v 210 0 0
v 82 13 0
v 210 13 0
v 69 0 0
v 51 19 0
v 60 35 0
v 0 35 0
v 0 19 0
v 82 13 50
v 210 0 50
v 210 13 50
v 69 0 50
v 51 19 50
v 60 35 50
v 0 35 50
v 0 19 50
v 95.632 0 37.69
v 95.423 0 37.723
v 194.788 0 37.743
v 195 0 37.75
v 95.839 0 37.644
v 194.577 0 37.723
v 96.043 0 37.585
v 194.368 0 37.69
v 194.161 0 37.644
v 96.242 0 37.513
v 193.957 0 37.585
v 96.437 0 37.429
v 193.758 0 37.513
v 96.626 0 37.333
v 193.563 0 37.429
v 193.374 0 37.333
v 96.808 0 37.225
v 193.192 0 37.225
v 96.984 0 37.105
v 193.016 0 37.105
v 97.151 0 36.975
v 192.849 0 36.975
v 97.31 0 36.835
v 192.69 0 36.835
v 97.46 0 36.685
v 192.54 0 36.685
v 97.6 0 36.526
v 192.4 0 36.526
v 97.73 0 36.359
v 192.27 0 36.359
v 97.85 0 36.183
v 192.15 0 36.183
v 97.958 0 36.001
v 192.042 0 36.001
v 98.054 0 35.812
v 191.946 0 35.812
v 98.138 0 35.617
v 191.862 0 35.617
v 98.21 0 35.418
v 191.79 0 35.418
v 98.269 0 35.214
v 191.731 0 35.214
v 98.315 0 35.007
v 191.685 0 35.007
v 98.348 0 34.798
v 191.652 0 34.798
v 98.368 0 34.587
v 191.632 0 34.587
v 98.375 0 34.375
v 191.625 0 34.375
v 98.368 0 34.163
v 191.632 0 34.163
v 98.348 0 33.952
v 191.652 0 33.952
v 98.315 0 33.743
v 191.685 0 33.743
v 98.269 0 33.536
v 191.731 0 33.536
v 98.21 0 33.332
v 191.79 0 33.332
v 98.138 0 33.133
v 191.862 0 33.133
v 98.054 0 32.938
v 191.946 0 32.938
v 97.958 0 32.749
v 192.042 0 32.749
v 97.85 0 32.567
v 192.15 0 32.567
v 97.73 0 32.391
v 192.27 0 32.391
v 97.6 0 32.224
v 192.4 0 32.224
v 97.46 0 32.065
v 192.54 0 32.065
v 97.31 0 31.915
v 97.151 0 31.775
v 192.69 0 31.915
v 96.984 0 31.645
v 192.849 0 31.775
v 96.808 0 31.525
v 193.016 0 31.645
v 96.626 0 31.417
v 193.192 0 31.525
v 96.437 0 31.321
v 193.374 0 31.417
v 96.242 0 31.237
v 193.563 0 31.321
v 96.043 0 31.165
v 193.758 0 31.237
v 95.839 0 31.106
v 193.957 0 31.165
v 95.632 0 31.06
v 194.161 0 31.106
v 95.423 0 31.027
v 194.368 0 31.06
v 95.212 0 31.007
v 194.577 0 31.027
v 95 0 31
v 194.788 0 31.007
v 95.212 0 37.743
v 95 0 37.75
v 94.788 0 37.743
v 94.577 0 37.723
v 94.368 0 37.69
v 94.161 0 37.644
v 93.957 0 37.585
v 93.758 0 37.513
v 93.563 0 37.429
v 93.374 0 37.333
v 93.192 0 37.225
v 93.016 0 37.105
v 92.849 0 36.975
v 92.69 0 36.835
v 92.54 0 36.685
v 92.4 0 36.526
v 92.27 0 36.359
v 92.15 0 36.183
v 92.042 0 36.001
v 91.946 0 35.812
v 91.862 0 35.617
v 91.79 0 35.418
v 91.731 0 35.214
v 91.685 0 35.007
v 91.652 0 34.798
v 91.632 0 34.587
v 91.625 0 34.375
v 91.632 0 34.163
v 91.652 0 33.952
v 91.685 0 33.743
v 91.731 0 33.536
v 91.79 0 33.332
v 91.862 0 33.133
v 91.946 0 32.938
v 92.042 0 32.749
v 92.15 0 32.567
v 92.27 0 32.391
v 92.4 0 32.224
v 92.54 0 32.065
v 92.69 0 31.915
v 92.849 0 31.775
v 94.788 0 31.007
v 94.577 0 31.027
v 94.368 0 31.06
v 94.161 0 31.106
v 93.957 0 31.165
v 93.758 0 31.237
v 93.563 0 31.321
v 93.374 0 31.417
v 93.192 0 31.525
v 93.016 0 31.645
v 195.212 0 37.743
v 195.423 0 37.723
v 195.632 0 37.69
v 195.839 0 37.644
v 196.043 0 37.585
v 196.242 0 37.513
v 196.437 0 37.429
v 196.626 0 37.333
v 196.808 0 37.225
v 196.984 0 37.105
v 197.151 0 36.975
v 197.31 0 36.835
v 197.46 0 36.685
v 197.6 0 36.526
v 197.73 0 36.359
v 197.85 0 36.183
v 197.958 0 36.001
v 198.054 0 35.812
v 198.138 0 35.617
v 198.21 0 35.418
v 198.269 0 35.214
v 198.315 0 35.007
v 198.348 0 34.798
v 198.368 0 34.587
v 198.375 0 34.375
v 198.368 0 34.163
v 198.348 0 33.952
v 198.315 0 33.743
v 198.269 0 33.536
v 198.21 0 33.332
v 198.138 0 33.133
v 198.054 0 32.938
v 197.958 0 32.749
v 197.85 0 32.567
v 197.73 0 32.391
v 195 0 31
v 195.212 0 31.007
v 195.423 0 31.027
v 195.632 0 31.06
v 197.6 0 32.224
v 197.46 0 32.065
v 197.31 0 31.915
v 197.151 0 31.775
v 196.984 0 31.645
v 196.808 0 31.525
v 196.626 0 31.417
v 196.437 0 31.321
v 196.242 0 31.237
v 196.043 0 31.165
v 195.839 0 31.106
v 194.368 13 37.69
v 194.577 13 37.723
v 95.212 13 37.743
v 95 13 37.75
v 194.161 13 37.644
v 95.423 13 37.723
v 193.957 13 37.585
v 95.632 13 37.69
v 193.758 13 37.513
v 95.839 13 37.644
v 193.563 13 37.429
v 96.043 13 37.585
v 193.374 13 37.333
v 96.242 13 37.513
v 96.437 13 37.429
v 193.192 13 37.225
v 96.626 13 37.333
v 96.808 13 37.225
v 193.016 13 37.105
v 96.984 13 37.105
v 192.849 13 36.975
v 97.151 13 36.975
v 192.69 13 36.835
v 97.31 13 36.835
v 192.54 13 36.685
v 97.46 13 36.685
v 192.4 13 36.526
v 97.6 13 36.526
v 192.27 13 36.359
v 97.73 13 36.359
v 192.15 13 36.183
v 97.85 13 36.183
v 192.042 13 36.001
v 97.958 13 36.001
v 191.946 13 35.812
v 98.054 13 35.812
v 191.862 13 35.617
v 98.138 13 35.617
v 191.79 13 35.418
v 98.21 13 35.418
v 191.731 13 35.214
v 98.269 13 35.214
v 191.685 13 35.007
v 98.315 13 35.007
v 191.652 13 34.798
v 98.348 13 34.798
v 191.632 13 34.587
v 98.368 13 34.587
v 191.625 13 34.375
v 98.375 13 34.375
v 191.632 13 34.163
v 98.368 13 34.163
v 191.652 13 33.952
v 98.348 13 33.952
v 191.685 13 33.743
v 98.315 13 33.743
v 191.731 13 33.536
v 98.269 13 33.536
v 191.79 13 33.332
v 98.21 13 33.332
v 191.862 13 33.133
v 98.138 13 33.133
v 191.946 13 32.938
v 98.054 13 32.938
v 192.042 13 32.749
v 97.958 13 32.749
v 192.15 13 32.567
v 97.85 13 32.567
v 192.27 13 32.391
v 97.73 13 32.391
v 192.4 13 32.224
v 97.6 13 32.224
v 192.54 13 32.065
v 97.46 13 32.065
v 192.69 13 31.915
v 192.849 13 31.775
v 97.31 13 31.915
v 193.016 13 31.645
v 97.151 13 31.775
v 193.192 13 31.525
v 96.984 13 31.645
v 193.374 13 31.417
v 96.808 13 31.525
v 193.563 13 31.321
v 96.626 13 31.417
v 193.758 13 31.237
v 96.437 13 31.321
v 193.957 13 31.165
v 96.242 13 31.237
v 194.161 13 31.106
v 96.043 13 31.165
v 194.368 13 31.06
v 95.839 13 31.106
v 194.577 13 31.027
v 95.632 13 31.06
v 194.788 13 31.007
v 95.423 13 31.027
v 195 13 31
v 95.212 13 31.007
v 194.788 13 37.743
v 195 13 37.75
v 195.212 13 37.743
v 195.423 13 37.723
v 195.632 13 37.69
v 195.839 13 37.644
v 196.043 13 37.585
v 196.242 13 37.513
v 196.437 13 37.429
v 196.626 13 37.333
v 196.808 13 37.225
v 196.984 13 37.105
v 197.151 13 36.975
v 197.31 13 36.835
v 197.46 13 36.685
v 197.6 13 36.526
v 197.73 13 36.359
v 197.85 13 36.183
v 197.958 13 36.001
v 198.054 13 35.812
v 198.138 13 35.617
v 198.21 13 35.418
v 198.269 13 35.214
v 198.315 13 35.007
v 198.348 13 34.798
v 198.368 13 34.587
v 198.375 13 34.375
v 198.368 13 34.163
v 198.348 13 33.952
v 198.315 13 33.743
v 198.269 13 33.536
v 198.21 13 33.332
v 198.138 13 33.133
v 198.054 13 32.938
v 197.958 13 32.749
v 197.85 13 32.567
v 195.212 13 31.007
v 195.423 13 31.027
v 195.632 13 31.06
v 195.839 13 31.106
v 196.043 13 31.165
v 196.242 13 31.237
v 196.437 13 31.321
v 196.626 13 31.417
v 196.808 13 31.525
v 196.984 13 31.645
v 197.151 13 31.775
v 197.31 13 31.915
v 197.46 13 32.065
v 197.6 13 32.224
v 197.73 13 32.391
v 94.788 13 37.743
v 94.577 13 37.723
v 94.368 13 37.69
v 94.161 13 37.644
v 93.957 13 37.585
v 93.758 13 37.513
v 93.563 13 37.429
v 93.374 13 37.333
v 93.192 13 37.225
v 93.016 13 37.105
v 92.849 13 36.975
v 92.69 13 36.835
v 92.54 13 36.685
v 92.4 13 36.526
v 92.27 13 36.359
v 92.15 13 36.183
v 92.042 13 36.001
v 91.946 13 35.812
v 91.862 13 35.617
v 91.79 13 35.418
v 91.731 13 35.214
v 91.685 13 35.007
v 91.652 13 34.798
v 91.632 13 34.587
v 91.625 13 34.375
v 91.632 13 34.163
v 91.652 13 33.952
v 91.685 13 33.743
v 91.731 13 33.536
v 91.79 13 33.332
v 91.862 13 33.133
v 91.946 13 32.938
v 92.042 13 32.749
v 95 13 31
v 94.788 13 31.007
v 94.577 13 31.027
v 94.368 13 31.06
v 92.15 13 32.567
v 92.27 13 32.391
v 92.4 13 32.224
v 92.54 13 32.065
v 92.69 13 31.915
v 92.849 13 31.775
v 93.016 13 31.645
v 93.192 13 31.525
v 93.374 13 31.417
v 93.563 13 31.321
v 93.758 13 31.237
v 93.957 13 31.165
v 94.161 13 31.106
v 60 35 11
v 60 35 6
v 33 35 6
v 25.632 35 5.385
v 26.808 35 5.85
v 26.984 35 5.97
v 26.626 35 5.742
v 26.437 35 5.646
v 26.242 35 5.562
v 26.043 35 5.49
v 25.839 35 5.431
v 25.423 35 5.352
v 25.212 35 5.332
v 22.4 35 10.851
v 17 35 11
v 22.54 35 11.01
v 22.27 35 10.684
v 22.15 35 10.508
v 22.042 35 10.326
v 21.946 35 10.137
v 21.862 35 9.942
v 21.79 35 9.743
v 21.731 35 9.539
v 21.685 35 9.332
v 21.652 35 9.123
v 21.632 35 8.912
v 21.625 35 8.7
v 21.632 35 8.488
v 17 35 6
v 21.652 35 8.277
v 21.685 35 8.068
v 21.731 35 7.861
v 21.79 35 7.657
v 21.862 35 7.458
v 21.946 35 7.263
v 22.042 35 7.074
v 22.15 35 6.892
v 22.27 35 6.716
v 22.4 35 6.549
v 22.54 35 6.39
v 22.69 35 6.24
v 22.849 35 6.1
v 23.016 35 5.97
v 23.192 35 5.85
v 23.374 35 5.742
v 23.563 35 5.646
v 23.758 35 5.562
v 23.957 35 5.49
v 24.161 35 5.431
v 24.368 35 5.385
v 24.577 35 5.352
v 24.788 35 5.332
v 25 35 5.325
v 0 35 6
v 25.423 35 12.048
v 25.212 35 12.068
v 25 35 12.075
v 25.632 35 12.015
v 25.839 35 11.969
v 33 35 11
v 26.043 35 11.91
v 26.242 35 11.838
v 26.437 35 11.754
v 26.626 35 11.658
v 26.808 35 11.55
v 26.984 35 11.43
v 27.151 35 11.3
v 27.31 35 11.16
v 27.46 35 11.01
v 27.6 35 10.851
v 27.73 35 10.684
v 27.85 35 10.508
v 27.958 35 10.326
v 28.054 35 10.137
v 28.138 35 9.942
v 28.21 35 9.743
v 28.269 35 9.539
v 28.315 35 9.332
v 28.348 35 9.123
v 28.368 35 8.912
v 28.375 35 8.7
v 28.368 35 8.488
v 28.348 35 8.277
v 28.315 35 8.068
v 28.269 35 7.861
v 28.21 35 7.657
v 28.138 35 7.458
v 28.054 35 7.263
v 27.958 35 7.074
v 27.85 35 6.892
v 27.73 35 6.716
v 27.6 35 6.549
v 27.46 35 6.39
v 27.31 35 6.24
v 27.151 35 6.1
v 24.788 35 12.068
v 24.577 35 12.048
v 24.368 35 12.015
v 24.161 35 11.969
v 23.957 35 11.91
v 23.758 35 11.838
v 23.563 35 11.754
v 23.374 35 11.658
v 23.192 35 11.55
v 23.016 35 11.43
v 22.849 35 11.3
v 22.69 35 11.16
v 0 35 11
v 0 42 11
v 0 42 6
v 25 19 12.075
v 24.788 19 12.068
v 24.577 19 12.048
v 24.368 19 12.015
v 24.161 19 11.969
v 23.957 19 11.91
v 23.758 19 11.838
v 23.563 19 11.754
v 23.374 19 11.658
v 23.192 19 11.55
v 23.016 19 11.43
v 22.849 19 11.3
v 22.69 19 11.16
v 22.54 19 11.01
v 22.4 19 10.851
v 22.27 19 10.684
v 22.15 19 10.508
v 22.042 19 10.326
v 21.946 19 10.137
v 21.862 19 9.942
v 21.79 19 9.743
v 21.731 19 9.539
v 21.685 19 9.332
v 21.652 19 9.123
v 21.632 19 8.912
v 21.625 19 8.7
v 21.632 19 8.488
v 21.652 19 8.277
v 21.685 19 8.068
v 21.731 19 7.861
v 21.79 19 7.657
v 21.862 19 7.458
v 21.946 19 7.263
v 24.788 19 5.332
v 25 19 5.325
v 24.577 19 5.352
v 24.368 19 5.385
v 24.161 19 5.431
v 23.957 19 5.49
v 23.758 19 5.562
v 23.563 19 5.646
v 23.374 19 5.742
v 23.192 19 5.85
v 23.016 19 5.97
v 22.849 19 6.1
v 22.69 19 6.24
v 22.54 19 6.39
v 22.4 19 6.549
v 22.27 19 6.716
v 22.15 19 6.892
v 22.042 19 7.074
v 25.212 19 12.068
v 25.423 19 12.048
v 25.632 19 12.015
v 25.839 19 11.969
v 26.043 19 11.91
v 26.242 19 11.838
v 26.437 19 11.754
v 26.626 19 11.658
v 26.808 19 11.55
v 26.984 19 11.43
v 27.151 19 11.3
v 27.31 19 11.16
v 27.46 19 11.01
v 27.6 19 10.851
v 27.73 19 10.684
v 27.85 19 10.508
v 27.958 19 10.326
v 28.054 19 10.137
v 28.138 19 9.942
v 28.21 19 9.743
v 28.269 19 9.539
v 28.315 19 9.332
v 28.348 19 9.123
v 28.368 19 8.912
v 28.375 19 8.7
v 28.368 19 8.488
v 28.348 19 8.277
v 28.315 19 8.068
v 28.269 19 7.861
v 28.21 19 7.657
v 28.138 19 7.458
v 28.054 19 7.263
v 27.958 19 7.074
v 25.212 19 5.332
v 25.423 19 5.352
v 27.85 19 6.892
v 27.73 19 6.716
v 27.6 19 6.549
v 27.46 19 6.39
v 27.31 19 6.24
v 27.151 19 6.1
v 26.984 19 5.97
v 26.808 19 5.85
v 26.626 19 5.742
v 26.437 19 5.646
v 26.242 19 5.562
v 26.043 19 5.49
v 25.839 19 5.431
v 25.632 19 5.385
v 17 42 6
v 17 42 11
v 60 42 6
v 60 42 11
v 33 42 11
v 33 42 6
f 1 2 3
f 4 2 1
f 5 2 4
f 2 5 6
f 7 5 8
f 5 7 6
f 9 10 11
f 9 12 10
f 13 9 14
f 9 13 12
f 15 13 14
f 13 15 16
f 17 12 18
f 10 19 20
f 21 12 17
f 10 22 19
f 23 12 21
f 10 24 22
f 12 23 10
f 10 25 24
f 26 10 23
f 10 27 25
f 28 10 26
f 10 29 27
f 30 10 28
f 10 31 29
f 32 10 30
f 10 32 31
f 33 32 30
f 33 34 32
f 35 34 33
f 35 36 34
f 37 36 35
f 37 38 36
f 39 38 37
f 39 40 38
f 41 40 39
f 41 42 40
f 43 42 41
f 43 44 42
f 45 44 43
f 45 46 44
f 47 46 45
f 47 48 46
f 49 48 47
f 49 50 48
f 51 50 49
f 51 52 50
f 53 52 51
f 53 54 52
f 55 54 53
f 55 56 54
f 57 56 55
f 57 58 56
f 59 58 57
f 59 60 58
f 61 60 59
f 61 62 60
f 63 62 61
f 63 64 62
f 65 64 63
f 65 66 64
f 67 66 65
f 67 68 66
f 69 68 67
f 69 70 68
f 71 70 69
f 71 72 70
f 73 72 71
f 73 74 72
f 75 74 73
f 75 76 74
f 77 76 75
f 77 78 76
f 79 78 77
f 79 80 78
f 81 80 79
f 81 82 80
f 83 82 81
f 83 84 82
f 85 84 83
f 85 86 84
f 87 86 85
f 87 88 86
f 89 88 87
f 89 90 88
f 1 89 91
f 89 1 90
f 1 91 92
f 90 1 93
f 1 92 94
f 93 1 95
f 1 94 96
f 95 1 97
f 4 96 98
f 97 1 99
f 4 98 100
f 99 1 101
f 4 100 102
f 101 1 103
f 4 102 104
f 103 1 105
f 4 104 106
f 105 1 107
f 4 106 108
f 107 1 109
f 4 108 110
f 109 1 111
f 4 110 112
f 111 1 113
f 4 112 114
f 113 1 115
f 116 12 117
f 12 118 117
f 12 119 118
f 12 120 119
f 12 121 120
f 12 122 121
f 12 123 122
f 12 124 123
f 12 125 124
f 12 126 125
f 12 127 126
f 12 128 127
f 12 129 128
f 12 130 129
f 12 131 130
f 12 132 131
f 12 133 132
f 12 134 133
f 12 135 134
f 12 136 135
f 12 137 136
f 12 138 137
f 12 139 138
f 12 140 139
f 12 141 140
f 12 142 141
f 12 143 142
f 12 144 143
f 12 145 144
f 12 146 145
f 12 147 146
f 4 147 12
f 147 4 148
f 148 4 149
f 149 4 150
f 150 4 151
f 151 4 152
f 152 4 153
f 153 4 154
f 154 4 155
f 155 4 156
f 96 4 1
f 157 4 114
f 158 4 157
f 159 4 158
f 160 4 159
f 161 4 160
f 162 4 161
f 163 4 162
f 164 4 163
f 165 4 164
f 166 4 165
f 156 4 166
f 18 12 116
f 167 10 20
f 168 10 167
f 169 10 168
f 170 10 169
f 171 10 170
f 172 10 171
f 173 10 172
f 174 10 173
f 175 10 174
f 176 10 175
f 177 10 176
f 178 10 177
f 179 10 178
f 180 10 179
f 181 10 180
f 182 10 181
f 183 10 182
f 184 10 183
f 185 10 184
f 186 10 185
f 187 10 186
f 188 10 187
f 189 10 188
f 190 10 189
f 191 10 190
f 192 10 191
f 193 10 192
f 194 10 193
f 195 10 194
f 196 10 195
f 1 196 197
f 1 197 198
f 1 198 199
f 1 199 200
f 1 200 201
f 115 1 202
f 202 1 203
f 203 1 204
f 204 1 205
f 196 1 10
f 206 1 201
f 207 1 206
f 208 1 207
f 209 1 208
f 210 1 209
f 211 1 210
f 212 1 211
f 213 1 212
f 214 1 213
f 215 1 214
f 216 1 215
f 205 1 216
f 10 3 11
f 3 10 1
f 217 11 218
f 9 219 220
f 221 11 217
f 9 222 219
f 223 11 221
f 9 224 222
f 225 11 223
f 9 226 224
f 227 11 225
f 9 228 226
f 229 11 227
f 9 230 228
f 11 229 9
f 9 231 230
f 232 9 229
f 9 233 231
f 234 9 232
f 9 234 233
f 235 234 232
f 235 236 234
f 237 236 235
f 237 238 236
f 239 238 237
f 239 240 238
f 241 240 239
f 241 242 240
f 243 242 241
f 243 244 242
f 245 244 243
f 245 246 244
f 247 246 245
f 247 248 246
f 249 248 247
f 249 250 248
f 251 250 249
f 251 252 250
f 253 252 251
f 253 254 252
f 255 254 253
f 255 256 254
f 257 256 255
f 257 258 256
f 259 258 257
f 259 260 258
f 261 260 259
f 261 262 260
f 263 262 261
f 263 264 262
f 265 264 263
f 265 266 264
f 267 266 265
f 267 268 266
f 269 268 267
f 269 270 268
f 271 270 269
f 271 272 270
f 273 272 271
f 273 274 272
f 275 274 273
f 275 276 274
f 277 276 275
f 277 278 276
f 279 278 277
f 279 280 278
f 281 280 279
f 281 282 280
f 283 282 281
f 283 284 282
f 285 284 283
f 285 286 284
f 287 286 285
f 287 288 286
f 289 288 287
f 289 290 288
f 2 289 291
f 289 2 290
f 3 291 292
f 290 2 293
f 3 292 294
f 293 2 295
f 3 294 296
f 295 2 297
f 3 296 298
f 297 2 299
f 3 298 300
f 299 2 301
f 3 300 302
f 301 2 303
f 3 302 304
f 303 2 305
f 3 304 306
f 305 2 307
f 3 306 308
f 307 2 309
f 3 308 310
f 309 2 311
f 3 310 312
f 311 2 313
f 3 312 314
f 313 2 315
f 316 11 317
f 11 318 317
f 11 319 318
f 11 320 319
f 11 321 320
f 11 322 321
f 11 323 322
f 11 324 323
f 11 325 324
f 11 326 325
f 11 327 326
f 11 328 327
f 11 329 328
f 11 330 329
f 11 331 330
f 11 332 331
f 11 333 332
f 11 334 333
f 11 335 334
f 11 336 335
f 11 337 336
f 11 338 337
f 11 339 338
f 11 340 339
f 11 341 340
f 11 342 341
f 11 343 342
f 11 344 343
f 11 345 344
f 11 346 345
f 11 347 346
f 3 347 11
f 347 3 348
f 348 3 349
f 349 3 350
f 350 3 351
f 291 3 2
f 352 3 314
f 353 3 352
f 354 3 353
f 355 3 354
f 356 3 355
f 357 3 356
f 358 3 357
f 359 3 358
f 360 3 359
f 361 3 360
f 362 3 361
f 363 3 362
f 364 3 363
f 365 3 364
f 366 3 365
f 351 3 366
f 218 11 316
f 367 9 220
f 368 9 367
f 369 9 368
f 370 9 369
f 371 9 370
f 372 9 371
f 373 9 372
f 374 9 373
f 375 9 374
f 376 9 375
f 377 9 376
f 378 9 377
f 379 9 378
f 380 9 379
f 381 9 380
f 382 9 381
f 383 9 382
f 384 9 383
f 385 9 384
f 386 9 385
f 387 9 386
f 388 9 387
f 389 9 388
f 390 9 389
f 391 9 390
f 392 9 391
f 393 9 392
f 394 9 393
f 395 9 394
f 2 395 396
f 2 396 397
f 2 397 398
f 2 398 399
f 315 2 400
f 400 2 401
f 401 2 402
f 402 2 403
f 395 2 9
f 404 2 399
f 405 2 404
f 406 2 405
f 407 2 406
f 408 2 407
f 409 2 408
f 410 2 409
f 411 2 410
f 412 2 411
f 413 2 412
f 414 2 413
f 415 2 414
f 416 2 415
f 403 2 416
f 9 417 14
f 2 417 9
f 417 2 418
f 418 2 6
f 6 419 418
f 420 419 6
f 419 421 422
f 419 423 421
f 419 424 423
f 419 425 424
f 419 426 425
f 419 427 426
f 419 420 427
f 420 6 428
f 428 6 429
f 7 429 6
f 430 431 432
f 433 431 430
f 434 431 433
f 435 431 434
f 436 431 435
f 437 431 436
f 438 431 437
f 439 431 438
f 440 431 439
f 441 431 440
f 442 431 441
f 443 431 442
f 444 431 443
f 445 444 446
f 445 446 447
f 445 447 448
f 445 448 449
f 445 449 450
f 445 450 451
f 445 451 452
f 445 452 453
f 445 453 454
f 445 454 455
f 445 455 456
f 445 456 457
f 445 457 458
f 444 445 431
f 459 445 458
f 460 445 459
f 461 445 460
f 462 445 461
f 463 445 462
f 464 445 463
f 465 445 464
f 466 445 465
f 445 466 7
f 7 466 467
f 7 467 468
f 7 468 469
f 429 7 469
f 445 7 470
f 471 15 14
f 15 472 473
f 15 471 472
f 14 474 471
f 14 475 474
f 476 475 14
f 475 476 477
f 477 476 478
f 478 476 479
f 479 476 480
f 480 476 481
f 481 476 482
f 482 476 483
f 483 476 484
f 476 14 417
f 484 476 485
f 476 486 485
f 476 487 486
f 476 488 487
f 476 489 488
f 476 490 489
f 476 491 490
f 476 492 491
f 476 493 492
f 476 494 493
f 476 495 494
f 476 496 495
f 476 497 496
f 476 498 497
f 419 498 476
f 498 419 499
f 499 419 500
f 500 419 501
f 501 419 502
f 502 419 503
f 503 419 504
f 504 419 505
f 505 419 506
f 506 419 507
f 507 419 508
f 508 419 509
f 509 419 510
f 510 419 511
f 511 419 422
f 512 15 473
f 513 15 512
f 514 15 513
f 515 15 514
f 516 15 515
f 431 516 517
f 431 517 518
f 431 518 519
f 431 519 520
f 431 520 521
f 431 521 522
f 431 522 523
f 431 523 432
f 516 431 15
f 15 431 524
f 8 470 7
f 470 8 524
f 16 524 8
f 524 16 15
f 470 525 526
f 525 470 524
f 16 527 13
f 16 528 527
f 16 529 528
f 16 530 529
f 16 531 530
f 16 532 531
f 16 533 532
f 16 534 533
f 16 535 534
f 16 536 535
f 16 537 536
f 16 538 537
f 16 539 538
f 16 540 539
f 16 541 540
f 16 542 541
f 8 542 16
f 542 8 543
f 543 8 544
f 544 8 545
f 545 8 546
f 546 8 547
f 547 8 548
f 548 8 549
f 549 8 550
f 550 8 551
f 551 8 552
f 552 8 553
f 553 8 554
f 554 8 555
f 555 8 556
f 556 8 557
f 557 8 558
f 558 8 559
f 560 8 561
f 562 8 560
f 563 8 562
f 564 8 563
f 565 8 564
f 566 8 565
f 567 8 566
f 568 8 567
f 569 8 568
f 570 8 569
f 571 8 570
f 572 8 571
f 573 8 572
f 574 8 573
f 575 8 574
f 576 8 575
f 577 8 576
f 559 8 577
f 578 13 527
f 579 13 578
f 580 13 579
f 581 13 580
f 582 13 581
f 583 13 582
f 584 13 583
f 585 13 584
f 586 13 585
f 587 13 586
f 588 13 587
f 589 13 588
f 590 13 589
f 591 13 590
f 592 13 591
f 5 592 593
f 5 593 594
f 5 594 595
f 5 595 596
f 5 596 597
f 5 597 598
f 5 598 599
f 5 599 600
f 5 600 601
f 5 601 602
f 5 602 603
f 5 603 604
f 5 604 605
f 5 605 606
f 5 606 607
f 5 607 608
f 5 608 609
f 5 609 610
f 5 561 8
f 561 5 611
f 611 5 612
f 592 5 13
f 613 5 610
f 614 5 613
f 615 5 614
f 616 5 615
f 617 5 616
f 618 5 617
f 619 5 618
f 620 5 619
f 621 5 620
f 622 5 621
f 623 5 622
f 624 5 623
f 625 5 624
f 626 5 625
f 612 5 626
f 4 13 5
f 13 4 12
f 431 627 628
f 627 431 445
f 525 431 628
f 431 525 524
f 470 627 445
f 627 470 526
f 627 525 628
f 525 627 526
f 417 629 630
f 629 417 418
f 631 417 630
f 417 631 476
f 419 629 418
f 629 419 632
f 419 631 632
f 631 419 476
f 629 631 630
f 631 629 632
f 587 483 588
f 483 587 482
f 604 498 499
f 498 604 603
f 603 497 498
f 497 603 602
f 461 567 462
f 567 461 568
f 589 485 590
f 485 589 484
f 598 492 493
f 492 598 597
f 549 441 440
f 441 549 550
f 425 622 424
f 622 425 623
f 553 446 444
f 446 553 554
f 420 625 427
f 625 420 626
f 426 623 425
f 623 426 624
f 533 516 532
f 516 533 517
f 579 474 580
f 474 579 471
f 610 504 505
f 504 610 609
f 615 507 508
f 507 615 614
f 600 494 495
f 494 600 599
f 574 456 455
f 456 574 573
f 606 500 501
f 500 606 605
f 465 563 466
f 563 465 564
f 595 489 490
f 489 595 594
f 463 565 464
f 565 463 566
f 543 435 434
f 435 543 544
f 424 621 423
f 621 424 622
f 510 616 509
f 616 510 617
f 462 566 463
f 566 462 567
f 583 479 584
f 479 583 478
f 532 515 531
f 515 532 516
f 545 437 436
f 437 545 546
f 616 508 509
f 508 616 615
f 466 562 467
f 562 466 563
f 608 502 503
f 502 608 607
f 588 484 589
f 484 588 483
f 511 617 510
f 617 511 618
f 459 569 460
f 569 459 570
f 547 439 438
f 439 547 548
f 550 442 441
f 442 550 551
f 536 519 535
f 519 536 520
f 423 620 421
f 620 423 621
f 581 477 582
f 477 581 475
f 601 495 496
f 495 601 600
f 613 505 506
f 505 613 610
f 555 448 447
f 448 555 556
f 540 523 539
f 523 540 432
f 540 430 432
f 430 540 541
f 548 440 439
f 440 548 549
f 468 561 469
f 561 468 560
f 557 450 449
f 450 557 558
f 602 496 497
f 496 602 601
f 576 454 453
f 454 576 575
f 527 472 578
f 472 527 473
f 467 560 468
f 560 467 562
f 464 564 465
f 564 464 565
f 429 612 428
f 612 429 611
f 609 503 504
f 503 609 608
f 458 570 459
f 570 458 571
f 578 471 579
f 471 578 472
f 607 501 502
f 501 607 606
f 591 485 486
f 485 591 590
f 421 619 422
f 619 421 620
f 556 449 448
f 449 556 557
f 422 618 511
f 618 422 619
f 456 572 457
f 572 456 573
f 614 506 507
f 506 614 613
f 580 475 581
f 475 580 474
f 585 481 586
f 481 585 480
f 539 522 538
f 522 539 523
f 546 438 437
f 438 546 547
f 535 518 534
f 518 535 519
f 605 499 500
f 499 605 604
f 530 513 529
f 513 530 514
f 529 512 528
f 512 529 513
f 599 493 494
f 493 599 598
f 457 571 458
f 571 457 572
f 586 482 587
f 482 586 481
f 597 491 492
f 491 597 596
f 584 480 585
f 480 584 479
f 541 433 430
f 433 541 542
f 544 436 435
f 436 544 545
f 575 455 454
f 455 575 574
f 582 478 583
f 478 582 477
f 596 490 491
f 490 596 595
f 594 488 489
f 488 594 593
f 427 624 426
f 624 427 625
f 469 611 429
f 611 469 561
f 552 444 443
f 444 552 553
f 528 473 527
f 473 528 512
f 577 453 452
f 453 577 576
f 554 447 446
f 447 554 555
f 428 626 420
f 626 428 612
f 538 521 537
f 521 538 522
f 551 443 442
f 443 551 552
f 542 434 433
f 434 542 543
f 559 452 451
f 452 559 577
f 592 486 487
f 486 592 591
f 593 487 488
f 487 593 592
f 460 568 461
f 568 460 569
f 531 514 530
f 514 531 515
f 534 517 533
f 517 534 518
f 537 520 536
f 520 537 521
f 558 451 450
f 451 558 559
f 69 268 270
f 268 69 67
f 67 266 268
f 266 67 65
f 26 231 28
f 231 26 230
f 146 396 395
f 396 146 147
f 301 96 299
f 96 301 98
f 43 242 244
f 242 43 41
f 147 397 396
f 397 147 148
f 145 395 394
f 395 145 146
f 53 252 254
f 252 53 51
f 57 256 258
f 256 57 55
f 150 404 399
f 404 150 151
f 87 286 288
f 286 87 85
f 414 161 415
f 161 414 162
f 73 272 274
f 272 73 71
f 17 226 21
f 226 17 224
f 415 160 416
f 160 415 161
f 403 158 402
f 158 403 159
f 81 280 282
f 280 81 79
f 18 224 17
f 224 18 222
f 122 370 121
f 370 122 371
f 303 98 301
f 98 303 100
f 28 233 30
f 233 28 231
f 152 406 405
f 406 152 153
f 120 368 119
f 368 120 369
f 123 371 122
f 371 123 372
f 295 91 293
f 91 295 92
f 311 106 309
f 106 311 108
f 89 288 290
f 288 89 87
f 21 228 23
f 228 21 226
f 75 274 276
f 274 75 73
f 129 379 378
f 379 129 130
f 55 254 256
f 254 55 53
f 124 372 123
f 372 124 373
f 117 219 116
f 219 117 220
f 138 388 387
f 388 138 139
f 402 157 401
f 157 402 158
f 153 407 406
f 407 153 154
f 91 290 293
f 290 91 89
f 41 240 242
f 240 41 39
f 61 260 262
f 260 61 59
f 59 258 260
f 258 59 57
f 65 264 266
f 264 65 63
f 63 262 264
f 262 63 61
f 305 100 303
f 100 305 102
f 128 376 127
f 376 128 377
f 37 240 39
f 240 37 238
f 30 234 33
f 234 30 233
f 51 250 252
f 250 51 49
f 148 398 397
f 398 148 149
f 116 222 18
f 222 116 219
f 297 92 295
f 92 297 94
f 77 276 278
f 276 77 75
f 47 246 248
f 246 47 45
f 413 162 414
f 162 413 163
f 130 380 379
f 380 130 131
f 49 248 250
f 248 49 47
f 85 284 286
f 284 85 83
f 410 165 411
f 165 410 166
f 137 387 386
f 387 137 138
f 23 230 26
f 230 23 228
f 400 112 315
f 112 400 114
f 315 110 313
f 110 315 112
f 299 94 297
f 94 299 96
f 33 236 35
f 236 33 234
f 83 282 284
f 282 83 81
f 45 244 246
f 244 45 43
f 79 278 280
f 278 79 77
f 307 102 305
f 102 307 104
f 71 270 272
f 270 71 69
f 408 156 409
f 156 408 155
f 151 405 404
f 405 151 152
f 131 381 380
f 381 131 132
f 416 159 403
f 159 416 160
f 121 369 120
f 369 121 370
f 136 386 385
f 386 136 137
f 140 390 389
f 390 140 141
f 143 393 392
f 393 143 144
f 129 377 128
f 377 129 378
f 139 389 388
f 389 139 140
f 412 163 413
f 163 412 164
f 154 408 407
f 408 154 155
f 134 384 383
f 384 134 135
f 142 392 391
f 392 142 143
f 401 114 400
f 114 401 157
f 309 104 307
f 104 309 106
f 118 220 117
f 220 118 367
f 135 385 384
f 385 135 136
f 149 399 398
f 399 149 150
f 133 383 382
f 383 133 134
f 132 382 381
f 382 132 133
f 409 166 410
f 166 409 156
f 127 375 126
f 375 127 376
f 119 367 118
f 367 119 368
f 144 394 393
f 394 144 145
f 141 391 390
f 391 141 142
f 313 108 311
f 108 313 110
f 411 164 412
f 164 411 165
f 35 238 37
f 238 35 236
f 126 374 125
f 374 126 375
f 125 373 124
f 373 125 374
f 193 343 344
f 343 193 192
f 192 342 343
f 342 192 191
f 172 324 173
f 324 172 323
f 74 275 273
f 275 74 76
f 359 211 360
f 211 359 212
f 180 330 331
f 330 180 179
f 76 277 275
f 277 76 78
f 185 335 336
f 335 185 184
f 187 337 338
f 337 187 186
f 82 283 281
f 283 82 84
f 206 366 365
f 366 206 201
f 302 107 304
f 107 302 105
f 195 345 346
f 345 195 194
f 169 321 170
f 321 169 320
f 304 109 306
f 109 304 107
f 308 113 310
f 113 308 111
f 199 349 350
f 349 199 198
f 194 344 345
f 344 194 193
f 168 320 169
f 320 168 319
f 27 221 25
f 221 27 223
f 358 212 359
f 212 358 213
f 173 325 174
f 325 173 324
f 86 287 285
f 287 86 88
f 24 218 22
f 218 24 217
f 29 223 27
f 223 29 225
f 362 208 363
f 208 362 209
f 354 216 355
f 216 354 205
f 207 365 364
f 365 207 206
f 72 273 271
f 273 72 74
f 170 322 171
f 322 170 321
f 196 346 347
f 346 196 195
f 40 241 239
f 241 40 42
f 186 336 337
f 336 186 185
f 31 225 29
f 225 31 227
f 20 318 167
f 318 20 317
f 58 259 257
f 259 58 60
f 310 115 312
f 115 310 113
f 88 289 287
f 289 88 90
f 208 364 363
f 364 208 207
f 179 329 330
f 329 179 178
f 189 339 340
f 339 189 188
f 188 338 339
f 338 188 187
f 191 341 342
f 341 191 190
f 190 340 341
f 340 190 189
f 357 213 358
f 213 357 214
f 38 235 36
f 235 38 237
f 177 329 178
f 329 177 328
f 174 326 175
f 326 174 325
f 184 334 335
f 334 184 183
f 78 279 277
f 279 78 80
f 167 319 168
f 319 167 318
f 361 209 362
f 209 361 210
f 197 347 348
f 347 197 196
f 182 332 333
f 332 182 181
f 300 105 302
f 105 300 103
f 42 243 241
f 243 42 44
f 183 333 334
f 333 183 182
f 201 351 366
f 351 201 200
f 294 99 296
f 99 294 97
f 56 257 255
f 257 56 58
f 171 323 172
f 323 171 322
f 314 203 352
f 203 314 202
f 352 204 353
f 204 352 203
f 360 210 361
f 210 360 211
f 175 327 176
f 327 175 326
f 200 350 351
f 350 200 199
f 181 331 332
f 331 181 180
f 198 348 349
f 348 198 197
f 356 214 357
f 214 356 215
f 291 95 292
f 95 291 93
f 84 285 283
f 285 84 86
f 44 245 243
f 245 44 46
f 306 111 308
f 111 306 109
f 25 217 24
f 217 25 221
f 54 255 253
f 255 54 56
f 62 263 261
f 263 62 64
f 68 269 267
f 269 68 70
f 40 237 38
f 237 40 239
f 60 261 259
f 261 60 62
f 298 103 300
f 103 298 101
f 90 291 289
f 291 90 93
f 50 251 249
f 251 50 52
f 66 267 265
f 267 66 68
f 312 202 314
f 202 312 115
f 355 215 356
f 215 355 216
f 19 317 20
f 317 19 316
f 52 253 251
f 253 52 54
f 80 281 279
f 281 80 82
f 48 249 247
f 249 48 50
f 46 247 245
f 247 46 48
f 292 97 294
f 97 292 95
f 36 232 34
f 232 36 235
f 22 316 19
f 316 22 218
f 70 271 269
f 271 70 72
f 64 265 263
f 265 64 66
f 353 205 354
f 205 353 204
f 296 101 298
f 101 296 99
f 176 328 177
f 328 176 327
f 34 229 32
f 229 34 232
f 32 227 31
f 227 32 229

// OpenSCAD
$fn = $preview ? 25 : 100;
difference(){
    union(){
    linear_extrude(50)
    difference(){
        square([210,35]);
        polygon([[60,35],[220,35],[220,13],[82,13]]);
        polygon([[0,0],[0,19],[51,19],[69,0]]);
    

    }
    
    translate([0,35,6]) cube([17,7,5]);
    translate([33,35,6]) cube([27,7,5]);
    }

    translate([25,15,8.7]) rotate([-90,0,0])cylinder(d=6.75,h=50);
    
    translate([95,-5,34.375]) rotate([-90,0,0])cylinder(d=6.75,h=50);
    
    translate([195,-5,34.375]) rotate([-90,0,0])cylinder(d=6.75,h=50);
}
